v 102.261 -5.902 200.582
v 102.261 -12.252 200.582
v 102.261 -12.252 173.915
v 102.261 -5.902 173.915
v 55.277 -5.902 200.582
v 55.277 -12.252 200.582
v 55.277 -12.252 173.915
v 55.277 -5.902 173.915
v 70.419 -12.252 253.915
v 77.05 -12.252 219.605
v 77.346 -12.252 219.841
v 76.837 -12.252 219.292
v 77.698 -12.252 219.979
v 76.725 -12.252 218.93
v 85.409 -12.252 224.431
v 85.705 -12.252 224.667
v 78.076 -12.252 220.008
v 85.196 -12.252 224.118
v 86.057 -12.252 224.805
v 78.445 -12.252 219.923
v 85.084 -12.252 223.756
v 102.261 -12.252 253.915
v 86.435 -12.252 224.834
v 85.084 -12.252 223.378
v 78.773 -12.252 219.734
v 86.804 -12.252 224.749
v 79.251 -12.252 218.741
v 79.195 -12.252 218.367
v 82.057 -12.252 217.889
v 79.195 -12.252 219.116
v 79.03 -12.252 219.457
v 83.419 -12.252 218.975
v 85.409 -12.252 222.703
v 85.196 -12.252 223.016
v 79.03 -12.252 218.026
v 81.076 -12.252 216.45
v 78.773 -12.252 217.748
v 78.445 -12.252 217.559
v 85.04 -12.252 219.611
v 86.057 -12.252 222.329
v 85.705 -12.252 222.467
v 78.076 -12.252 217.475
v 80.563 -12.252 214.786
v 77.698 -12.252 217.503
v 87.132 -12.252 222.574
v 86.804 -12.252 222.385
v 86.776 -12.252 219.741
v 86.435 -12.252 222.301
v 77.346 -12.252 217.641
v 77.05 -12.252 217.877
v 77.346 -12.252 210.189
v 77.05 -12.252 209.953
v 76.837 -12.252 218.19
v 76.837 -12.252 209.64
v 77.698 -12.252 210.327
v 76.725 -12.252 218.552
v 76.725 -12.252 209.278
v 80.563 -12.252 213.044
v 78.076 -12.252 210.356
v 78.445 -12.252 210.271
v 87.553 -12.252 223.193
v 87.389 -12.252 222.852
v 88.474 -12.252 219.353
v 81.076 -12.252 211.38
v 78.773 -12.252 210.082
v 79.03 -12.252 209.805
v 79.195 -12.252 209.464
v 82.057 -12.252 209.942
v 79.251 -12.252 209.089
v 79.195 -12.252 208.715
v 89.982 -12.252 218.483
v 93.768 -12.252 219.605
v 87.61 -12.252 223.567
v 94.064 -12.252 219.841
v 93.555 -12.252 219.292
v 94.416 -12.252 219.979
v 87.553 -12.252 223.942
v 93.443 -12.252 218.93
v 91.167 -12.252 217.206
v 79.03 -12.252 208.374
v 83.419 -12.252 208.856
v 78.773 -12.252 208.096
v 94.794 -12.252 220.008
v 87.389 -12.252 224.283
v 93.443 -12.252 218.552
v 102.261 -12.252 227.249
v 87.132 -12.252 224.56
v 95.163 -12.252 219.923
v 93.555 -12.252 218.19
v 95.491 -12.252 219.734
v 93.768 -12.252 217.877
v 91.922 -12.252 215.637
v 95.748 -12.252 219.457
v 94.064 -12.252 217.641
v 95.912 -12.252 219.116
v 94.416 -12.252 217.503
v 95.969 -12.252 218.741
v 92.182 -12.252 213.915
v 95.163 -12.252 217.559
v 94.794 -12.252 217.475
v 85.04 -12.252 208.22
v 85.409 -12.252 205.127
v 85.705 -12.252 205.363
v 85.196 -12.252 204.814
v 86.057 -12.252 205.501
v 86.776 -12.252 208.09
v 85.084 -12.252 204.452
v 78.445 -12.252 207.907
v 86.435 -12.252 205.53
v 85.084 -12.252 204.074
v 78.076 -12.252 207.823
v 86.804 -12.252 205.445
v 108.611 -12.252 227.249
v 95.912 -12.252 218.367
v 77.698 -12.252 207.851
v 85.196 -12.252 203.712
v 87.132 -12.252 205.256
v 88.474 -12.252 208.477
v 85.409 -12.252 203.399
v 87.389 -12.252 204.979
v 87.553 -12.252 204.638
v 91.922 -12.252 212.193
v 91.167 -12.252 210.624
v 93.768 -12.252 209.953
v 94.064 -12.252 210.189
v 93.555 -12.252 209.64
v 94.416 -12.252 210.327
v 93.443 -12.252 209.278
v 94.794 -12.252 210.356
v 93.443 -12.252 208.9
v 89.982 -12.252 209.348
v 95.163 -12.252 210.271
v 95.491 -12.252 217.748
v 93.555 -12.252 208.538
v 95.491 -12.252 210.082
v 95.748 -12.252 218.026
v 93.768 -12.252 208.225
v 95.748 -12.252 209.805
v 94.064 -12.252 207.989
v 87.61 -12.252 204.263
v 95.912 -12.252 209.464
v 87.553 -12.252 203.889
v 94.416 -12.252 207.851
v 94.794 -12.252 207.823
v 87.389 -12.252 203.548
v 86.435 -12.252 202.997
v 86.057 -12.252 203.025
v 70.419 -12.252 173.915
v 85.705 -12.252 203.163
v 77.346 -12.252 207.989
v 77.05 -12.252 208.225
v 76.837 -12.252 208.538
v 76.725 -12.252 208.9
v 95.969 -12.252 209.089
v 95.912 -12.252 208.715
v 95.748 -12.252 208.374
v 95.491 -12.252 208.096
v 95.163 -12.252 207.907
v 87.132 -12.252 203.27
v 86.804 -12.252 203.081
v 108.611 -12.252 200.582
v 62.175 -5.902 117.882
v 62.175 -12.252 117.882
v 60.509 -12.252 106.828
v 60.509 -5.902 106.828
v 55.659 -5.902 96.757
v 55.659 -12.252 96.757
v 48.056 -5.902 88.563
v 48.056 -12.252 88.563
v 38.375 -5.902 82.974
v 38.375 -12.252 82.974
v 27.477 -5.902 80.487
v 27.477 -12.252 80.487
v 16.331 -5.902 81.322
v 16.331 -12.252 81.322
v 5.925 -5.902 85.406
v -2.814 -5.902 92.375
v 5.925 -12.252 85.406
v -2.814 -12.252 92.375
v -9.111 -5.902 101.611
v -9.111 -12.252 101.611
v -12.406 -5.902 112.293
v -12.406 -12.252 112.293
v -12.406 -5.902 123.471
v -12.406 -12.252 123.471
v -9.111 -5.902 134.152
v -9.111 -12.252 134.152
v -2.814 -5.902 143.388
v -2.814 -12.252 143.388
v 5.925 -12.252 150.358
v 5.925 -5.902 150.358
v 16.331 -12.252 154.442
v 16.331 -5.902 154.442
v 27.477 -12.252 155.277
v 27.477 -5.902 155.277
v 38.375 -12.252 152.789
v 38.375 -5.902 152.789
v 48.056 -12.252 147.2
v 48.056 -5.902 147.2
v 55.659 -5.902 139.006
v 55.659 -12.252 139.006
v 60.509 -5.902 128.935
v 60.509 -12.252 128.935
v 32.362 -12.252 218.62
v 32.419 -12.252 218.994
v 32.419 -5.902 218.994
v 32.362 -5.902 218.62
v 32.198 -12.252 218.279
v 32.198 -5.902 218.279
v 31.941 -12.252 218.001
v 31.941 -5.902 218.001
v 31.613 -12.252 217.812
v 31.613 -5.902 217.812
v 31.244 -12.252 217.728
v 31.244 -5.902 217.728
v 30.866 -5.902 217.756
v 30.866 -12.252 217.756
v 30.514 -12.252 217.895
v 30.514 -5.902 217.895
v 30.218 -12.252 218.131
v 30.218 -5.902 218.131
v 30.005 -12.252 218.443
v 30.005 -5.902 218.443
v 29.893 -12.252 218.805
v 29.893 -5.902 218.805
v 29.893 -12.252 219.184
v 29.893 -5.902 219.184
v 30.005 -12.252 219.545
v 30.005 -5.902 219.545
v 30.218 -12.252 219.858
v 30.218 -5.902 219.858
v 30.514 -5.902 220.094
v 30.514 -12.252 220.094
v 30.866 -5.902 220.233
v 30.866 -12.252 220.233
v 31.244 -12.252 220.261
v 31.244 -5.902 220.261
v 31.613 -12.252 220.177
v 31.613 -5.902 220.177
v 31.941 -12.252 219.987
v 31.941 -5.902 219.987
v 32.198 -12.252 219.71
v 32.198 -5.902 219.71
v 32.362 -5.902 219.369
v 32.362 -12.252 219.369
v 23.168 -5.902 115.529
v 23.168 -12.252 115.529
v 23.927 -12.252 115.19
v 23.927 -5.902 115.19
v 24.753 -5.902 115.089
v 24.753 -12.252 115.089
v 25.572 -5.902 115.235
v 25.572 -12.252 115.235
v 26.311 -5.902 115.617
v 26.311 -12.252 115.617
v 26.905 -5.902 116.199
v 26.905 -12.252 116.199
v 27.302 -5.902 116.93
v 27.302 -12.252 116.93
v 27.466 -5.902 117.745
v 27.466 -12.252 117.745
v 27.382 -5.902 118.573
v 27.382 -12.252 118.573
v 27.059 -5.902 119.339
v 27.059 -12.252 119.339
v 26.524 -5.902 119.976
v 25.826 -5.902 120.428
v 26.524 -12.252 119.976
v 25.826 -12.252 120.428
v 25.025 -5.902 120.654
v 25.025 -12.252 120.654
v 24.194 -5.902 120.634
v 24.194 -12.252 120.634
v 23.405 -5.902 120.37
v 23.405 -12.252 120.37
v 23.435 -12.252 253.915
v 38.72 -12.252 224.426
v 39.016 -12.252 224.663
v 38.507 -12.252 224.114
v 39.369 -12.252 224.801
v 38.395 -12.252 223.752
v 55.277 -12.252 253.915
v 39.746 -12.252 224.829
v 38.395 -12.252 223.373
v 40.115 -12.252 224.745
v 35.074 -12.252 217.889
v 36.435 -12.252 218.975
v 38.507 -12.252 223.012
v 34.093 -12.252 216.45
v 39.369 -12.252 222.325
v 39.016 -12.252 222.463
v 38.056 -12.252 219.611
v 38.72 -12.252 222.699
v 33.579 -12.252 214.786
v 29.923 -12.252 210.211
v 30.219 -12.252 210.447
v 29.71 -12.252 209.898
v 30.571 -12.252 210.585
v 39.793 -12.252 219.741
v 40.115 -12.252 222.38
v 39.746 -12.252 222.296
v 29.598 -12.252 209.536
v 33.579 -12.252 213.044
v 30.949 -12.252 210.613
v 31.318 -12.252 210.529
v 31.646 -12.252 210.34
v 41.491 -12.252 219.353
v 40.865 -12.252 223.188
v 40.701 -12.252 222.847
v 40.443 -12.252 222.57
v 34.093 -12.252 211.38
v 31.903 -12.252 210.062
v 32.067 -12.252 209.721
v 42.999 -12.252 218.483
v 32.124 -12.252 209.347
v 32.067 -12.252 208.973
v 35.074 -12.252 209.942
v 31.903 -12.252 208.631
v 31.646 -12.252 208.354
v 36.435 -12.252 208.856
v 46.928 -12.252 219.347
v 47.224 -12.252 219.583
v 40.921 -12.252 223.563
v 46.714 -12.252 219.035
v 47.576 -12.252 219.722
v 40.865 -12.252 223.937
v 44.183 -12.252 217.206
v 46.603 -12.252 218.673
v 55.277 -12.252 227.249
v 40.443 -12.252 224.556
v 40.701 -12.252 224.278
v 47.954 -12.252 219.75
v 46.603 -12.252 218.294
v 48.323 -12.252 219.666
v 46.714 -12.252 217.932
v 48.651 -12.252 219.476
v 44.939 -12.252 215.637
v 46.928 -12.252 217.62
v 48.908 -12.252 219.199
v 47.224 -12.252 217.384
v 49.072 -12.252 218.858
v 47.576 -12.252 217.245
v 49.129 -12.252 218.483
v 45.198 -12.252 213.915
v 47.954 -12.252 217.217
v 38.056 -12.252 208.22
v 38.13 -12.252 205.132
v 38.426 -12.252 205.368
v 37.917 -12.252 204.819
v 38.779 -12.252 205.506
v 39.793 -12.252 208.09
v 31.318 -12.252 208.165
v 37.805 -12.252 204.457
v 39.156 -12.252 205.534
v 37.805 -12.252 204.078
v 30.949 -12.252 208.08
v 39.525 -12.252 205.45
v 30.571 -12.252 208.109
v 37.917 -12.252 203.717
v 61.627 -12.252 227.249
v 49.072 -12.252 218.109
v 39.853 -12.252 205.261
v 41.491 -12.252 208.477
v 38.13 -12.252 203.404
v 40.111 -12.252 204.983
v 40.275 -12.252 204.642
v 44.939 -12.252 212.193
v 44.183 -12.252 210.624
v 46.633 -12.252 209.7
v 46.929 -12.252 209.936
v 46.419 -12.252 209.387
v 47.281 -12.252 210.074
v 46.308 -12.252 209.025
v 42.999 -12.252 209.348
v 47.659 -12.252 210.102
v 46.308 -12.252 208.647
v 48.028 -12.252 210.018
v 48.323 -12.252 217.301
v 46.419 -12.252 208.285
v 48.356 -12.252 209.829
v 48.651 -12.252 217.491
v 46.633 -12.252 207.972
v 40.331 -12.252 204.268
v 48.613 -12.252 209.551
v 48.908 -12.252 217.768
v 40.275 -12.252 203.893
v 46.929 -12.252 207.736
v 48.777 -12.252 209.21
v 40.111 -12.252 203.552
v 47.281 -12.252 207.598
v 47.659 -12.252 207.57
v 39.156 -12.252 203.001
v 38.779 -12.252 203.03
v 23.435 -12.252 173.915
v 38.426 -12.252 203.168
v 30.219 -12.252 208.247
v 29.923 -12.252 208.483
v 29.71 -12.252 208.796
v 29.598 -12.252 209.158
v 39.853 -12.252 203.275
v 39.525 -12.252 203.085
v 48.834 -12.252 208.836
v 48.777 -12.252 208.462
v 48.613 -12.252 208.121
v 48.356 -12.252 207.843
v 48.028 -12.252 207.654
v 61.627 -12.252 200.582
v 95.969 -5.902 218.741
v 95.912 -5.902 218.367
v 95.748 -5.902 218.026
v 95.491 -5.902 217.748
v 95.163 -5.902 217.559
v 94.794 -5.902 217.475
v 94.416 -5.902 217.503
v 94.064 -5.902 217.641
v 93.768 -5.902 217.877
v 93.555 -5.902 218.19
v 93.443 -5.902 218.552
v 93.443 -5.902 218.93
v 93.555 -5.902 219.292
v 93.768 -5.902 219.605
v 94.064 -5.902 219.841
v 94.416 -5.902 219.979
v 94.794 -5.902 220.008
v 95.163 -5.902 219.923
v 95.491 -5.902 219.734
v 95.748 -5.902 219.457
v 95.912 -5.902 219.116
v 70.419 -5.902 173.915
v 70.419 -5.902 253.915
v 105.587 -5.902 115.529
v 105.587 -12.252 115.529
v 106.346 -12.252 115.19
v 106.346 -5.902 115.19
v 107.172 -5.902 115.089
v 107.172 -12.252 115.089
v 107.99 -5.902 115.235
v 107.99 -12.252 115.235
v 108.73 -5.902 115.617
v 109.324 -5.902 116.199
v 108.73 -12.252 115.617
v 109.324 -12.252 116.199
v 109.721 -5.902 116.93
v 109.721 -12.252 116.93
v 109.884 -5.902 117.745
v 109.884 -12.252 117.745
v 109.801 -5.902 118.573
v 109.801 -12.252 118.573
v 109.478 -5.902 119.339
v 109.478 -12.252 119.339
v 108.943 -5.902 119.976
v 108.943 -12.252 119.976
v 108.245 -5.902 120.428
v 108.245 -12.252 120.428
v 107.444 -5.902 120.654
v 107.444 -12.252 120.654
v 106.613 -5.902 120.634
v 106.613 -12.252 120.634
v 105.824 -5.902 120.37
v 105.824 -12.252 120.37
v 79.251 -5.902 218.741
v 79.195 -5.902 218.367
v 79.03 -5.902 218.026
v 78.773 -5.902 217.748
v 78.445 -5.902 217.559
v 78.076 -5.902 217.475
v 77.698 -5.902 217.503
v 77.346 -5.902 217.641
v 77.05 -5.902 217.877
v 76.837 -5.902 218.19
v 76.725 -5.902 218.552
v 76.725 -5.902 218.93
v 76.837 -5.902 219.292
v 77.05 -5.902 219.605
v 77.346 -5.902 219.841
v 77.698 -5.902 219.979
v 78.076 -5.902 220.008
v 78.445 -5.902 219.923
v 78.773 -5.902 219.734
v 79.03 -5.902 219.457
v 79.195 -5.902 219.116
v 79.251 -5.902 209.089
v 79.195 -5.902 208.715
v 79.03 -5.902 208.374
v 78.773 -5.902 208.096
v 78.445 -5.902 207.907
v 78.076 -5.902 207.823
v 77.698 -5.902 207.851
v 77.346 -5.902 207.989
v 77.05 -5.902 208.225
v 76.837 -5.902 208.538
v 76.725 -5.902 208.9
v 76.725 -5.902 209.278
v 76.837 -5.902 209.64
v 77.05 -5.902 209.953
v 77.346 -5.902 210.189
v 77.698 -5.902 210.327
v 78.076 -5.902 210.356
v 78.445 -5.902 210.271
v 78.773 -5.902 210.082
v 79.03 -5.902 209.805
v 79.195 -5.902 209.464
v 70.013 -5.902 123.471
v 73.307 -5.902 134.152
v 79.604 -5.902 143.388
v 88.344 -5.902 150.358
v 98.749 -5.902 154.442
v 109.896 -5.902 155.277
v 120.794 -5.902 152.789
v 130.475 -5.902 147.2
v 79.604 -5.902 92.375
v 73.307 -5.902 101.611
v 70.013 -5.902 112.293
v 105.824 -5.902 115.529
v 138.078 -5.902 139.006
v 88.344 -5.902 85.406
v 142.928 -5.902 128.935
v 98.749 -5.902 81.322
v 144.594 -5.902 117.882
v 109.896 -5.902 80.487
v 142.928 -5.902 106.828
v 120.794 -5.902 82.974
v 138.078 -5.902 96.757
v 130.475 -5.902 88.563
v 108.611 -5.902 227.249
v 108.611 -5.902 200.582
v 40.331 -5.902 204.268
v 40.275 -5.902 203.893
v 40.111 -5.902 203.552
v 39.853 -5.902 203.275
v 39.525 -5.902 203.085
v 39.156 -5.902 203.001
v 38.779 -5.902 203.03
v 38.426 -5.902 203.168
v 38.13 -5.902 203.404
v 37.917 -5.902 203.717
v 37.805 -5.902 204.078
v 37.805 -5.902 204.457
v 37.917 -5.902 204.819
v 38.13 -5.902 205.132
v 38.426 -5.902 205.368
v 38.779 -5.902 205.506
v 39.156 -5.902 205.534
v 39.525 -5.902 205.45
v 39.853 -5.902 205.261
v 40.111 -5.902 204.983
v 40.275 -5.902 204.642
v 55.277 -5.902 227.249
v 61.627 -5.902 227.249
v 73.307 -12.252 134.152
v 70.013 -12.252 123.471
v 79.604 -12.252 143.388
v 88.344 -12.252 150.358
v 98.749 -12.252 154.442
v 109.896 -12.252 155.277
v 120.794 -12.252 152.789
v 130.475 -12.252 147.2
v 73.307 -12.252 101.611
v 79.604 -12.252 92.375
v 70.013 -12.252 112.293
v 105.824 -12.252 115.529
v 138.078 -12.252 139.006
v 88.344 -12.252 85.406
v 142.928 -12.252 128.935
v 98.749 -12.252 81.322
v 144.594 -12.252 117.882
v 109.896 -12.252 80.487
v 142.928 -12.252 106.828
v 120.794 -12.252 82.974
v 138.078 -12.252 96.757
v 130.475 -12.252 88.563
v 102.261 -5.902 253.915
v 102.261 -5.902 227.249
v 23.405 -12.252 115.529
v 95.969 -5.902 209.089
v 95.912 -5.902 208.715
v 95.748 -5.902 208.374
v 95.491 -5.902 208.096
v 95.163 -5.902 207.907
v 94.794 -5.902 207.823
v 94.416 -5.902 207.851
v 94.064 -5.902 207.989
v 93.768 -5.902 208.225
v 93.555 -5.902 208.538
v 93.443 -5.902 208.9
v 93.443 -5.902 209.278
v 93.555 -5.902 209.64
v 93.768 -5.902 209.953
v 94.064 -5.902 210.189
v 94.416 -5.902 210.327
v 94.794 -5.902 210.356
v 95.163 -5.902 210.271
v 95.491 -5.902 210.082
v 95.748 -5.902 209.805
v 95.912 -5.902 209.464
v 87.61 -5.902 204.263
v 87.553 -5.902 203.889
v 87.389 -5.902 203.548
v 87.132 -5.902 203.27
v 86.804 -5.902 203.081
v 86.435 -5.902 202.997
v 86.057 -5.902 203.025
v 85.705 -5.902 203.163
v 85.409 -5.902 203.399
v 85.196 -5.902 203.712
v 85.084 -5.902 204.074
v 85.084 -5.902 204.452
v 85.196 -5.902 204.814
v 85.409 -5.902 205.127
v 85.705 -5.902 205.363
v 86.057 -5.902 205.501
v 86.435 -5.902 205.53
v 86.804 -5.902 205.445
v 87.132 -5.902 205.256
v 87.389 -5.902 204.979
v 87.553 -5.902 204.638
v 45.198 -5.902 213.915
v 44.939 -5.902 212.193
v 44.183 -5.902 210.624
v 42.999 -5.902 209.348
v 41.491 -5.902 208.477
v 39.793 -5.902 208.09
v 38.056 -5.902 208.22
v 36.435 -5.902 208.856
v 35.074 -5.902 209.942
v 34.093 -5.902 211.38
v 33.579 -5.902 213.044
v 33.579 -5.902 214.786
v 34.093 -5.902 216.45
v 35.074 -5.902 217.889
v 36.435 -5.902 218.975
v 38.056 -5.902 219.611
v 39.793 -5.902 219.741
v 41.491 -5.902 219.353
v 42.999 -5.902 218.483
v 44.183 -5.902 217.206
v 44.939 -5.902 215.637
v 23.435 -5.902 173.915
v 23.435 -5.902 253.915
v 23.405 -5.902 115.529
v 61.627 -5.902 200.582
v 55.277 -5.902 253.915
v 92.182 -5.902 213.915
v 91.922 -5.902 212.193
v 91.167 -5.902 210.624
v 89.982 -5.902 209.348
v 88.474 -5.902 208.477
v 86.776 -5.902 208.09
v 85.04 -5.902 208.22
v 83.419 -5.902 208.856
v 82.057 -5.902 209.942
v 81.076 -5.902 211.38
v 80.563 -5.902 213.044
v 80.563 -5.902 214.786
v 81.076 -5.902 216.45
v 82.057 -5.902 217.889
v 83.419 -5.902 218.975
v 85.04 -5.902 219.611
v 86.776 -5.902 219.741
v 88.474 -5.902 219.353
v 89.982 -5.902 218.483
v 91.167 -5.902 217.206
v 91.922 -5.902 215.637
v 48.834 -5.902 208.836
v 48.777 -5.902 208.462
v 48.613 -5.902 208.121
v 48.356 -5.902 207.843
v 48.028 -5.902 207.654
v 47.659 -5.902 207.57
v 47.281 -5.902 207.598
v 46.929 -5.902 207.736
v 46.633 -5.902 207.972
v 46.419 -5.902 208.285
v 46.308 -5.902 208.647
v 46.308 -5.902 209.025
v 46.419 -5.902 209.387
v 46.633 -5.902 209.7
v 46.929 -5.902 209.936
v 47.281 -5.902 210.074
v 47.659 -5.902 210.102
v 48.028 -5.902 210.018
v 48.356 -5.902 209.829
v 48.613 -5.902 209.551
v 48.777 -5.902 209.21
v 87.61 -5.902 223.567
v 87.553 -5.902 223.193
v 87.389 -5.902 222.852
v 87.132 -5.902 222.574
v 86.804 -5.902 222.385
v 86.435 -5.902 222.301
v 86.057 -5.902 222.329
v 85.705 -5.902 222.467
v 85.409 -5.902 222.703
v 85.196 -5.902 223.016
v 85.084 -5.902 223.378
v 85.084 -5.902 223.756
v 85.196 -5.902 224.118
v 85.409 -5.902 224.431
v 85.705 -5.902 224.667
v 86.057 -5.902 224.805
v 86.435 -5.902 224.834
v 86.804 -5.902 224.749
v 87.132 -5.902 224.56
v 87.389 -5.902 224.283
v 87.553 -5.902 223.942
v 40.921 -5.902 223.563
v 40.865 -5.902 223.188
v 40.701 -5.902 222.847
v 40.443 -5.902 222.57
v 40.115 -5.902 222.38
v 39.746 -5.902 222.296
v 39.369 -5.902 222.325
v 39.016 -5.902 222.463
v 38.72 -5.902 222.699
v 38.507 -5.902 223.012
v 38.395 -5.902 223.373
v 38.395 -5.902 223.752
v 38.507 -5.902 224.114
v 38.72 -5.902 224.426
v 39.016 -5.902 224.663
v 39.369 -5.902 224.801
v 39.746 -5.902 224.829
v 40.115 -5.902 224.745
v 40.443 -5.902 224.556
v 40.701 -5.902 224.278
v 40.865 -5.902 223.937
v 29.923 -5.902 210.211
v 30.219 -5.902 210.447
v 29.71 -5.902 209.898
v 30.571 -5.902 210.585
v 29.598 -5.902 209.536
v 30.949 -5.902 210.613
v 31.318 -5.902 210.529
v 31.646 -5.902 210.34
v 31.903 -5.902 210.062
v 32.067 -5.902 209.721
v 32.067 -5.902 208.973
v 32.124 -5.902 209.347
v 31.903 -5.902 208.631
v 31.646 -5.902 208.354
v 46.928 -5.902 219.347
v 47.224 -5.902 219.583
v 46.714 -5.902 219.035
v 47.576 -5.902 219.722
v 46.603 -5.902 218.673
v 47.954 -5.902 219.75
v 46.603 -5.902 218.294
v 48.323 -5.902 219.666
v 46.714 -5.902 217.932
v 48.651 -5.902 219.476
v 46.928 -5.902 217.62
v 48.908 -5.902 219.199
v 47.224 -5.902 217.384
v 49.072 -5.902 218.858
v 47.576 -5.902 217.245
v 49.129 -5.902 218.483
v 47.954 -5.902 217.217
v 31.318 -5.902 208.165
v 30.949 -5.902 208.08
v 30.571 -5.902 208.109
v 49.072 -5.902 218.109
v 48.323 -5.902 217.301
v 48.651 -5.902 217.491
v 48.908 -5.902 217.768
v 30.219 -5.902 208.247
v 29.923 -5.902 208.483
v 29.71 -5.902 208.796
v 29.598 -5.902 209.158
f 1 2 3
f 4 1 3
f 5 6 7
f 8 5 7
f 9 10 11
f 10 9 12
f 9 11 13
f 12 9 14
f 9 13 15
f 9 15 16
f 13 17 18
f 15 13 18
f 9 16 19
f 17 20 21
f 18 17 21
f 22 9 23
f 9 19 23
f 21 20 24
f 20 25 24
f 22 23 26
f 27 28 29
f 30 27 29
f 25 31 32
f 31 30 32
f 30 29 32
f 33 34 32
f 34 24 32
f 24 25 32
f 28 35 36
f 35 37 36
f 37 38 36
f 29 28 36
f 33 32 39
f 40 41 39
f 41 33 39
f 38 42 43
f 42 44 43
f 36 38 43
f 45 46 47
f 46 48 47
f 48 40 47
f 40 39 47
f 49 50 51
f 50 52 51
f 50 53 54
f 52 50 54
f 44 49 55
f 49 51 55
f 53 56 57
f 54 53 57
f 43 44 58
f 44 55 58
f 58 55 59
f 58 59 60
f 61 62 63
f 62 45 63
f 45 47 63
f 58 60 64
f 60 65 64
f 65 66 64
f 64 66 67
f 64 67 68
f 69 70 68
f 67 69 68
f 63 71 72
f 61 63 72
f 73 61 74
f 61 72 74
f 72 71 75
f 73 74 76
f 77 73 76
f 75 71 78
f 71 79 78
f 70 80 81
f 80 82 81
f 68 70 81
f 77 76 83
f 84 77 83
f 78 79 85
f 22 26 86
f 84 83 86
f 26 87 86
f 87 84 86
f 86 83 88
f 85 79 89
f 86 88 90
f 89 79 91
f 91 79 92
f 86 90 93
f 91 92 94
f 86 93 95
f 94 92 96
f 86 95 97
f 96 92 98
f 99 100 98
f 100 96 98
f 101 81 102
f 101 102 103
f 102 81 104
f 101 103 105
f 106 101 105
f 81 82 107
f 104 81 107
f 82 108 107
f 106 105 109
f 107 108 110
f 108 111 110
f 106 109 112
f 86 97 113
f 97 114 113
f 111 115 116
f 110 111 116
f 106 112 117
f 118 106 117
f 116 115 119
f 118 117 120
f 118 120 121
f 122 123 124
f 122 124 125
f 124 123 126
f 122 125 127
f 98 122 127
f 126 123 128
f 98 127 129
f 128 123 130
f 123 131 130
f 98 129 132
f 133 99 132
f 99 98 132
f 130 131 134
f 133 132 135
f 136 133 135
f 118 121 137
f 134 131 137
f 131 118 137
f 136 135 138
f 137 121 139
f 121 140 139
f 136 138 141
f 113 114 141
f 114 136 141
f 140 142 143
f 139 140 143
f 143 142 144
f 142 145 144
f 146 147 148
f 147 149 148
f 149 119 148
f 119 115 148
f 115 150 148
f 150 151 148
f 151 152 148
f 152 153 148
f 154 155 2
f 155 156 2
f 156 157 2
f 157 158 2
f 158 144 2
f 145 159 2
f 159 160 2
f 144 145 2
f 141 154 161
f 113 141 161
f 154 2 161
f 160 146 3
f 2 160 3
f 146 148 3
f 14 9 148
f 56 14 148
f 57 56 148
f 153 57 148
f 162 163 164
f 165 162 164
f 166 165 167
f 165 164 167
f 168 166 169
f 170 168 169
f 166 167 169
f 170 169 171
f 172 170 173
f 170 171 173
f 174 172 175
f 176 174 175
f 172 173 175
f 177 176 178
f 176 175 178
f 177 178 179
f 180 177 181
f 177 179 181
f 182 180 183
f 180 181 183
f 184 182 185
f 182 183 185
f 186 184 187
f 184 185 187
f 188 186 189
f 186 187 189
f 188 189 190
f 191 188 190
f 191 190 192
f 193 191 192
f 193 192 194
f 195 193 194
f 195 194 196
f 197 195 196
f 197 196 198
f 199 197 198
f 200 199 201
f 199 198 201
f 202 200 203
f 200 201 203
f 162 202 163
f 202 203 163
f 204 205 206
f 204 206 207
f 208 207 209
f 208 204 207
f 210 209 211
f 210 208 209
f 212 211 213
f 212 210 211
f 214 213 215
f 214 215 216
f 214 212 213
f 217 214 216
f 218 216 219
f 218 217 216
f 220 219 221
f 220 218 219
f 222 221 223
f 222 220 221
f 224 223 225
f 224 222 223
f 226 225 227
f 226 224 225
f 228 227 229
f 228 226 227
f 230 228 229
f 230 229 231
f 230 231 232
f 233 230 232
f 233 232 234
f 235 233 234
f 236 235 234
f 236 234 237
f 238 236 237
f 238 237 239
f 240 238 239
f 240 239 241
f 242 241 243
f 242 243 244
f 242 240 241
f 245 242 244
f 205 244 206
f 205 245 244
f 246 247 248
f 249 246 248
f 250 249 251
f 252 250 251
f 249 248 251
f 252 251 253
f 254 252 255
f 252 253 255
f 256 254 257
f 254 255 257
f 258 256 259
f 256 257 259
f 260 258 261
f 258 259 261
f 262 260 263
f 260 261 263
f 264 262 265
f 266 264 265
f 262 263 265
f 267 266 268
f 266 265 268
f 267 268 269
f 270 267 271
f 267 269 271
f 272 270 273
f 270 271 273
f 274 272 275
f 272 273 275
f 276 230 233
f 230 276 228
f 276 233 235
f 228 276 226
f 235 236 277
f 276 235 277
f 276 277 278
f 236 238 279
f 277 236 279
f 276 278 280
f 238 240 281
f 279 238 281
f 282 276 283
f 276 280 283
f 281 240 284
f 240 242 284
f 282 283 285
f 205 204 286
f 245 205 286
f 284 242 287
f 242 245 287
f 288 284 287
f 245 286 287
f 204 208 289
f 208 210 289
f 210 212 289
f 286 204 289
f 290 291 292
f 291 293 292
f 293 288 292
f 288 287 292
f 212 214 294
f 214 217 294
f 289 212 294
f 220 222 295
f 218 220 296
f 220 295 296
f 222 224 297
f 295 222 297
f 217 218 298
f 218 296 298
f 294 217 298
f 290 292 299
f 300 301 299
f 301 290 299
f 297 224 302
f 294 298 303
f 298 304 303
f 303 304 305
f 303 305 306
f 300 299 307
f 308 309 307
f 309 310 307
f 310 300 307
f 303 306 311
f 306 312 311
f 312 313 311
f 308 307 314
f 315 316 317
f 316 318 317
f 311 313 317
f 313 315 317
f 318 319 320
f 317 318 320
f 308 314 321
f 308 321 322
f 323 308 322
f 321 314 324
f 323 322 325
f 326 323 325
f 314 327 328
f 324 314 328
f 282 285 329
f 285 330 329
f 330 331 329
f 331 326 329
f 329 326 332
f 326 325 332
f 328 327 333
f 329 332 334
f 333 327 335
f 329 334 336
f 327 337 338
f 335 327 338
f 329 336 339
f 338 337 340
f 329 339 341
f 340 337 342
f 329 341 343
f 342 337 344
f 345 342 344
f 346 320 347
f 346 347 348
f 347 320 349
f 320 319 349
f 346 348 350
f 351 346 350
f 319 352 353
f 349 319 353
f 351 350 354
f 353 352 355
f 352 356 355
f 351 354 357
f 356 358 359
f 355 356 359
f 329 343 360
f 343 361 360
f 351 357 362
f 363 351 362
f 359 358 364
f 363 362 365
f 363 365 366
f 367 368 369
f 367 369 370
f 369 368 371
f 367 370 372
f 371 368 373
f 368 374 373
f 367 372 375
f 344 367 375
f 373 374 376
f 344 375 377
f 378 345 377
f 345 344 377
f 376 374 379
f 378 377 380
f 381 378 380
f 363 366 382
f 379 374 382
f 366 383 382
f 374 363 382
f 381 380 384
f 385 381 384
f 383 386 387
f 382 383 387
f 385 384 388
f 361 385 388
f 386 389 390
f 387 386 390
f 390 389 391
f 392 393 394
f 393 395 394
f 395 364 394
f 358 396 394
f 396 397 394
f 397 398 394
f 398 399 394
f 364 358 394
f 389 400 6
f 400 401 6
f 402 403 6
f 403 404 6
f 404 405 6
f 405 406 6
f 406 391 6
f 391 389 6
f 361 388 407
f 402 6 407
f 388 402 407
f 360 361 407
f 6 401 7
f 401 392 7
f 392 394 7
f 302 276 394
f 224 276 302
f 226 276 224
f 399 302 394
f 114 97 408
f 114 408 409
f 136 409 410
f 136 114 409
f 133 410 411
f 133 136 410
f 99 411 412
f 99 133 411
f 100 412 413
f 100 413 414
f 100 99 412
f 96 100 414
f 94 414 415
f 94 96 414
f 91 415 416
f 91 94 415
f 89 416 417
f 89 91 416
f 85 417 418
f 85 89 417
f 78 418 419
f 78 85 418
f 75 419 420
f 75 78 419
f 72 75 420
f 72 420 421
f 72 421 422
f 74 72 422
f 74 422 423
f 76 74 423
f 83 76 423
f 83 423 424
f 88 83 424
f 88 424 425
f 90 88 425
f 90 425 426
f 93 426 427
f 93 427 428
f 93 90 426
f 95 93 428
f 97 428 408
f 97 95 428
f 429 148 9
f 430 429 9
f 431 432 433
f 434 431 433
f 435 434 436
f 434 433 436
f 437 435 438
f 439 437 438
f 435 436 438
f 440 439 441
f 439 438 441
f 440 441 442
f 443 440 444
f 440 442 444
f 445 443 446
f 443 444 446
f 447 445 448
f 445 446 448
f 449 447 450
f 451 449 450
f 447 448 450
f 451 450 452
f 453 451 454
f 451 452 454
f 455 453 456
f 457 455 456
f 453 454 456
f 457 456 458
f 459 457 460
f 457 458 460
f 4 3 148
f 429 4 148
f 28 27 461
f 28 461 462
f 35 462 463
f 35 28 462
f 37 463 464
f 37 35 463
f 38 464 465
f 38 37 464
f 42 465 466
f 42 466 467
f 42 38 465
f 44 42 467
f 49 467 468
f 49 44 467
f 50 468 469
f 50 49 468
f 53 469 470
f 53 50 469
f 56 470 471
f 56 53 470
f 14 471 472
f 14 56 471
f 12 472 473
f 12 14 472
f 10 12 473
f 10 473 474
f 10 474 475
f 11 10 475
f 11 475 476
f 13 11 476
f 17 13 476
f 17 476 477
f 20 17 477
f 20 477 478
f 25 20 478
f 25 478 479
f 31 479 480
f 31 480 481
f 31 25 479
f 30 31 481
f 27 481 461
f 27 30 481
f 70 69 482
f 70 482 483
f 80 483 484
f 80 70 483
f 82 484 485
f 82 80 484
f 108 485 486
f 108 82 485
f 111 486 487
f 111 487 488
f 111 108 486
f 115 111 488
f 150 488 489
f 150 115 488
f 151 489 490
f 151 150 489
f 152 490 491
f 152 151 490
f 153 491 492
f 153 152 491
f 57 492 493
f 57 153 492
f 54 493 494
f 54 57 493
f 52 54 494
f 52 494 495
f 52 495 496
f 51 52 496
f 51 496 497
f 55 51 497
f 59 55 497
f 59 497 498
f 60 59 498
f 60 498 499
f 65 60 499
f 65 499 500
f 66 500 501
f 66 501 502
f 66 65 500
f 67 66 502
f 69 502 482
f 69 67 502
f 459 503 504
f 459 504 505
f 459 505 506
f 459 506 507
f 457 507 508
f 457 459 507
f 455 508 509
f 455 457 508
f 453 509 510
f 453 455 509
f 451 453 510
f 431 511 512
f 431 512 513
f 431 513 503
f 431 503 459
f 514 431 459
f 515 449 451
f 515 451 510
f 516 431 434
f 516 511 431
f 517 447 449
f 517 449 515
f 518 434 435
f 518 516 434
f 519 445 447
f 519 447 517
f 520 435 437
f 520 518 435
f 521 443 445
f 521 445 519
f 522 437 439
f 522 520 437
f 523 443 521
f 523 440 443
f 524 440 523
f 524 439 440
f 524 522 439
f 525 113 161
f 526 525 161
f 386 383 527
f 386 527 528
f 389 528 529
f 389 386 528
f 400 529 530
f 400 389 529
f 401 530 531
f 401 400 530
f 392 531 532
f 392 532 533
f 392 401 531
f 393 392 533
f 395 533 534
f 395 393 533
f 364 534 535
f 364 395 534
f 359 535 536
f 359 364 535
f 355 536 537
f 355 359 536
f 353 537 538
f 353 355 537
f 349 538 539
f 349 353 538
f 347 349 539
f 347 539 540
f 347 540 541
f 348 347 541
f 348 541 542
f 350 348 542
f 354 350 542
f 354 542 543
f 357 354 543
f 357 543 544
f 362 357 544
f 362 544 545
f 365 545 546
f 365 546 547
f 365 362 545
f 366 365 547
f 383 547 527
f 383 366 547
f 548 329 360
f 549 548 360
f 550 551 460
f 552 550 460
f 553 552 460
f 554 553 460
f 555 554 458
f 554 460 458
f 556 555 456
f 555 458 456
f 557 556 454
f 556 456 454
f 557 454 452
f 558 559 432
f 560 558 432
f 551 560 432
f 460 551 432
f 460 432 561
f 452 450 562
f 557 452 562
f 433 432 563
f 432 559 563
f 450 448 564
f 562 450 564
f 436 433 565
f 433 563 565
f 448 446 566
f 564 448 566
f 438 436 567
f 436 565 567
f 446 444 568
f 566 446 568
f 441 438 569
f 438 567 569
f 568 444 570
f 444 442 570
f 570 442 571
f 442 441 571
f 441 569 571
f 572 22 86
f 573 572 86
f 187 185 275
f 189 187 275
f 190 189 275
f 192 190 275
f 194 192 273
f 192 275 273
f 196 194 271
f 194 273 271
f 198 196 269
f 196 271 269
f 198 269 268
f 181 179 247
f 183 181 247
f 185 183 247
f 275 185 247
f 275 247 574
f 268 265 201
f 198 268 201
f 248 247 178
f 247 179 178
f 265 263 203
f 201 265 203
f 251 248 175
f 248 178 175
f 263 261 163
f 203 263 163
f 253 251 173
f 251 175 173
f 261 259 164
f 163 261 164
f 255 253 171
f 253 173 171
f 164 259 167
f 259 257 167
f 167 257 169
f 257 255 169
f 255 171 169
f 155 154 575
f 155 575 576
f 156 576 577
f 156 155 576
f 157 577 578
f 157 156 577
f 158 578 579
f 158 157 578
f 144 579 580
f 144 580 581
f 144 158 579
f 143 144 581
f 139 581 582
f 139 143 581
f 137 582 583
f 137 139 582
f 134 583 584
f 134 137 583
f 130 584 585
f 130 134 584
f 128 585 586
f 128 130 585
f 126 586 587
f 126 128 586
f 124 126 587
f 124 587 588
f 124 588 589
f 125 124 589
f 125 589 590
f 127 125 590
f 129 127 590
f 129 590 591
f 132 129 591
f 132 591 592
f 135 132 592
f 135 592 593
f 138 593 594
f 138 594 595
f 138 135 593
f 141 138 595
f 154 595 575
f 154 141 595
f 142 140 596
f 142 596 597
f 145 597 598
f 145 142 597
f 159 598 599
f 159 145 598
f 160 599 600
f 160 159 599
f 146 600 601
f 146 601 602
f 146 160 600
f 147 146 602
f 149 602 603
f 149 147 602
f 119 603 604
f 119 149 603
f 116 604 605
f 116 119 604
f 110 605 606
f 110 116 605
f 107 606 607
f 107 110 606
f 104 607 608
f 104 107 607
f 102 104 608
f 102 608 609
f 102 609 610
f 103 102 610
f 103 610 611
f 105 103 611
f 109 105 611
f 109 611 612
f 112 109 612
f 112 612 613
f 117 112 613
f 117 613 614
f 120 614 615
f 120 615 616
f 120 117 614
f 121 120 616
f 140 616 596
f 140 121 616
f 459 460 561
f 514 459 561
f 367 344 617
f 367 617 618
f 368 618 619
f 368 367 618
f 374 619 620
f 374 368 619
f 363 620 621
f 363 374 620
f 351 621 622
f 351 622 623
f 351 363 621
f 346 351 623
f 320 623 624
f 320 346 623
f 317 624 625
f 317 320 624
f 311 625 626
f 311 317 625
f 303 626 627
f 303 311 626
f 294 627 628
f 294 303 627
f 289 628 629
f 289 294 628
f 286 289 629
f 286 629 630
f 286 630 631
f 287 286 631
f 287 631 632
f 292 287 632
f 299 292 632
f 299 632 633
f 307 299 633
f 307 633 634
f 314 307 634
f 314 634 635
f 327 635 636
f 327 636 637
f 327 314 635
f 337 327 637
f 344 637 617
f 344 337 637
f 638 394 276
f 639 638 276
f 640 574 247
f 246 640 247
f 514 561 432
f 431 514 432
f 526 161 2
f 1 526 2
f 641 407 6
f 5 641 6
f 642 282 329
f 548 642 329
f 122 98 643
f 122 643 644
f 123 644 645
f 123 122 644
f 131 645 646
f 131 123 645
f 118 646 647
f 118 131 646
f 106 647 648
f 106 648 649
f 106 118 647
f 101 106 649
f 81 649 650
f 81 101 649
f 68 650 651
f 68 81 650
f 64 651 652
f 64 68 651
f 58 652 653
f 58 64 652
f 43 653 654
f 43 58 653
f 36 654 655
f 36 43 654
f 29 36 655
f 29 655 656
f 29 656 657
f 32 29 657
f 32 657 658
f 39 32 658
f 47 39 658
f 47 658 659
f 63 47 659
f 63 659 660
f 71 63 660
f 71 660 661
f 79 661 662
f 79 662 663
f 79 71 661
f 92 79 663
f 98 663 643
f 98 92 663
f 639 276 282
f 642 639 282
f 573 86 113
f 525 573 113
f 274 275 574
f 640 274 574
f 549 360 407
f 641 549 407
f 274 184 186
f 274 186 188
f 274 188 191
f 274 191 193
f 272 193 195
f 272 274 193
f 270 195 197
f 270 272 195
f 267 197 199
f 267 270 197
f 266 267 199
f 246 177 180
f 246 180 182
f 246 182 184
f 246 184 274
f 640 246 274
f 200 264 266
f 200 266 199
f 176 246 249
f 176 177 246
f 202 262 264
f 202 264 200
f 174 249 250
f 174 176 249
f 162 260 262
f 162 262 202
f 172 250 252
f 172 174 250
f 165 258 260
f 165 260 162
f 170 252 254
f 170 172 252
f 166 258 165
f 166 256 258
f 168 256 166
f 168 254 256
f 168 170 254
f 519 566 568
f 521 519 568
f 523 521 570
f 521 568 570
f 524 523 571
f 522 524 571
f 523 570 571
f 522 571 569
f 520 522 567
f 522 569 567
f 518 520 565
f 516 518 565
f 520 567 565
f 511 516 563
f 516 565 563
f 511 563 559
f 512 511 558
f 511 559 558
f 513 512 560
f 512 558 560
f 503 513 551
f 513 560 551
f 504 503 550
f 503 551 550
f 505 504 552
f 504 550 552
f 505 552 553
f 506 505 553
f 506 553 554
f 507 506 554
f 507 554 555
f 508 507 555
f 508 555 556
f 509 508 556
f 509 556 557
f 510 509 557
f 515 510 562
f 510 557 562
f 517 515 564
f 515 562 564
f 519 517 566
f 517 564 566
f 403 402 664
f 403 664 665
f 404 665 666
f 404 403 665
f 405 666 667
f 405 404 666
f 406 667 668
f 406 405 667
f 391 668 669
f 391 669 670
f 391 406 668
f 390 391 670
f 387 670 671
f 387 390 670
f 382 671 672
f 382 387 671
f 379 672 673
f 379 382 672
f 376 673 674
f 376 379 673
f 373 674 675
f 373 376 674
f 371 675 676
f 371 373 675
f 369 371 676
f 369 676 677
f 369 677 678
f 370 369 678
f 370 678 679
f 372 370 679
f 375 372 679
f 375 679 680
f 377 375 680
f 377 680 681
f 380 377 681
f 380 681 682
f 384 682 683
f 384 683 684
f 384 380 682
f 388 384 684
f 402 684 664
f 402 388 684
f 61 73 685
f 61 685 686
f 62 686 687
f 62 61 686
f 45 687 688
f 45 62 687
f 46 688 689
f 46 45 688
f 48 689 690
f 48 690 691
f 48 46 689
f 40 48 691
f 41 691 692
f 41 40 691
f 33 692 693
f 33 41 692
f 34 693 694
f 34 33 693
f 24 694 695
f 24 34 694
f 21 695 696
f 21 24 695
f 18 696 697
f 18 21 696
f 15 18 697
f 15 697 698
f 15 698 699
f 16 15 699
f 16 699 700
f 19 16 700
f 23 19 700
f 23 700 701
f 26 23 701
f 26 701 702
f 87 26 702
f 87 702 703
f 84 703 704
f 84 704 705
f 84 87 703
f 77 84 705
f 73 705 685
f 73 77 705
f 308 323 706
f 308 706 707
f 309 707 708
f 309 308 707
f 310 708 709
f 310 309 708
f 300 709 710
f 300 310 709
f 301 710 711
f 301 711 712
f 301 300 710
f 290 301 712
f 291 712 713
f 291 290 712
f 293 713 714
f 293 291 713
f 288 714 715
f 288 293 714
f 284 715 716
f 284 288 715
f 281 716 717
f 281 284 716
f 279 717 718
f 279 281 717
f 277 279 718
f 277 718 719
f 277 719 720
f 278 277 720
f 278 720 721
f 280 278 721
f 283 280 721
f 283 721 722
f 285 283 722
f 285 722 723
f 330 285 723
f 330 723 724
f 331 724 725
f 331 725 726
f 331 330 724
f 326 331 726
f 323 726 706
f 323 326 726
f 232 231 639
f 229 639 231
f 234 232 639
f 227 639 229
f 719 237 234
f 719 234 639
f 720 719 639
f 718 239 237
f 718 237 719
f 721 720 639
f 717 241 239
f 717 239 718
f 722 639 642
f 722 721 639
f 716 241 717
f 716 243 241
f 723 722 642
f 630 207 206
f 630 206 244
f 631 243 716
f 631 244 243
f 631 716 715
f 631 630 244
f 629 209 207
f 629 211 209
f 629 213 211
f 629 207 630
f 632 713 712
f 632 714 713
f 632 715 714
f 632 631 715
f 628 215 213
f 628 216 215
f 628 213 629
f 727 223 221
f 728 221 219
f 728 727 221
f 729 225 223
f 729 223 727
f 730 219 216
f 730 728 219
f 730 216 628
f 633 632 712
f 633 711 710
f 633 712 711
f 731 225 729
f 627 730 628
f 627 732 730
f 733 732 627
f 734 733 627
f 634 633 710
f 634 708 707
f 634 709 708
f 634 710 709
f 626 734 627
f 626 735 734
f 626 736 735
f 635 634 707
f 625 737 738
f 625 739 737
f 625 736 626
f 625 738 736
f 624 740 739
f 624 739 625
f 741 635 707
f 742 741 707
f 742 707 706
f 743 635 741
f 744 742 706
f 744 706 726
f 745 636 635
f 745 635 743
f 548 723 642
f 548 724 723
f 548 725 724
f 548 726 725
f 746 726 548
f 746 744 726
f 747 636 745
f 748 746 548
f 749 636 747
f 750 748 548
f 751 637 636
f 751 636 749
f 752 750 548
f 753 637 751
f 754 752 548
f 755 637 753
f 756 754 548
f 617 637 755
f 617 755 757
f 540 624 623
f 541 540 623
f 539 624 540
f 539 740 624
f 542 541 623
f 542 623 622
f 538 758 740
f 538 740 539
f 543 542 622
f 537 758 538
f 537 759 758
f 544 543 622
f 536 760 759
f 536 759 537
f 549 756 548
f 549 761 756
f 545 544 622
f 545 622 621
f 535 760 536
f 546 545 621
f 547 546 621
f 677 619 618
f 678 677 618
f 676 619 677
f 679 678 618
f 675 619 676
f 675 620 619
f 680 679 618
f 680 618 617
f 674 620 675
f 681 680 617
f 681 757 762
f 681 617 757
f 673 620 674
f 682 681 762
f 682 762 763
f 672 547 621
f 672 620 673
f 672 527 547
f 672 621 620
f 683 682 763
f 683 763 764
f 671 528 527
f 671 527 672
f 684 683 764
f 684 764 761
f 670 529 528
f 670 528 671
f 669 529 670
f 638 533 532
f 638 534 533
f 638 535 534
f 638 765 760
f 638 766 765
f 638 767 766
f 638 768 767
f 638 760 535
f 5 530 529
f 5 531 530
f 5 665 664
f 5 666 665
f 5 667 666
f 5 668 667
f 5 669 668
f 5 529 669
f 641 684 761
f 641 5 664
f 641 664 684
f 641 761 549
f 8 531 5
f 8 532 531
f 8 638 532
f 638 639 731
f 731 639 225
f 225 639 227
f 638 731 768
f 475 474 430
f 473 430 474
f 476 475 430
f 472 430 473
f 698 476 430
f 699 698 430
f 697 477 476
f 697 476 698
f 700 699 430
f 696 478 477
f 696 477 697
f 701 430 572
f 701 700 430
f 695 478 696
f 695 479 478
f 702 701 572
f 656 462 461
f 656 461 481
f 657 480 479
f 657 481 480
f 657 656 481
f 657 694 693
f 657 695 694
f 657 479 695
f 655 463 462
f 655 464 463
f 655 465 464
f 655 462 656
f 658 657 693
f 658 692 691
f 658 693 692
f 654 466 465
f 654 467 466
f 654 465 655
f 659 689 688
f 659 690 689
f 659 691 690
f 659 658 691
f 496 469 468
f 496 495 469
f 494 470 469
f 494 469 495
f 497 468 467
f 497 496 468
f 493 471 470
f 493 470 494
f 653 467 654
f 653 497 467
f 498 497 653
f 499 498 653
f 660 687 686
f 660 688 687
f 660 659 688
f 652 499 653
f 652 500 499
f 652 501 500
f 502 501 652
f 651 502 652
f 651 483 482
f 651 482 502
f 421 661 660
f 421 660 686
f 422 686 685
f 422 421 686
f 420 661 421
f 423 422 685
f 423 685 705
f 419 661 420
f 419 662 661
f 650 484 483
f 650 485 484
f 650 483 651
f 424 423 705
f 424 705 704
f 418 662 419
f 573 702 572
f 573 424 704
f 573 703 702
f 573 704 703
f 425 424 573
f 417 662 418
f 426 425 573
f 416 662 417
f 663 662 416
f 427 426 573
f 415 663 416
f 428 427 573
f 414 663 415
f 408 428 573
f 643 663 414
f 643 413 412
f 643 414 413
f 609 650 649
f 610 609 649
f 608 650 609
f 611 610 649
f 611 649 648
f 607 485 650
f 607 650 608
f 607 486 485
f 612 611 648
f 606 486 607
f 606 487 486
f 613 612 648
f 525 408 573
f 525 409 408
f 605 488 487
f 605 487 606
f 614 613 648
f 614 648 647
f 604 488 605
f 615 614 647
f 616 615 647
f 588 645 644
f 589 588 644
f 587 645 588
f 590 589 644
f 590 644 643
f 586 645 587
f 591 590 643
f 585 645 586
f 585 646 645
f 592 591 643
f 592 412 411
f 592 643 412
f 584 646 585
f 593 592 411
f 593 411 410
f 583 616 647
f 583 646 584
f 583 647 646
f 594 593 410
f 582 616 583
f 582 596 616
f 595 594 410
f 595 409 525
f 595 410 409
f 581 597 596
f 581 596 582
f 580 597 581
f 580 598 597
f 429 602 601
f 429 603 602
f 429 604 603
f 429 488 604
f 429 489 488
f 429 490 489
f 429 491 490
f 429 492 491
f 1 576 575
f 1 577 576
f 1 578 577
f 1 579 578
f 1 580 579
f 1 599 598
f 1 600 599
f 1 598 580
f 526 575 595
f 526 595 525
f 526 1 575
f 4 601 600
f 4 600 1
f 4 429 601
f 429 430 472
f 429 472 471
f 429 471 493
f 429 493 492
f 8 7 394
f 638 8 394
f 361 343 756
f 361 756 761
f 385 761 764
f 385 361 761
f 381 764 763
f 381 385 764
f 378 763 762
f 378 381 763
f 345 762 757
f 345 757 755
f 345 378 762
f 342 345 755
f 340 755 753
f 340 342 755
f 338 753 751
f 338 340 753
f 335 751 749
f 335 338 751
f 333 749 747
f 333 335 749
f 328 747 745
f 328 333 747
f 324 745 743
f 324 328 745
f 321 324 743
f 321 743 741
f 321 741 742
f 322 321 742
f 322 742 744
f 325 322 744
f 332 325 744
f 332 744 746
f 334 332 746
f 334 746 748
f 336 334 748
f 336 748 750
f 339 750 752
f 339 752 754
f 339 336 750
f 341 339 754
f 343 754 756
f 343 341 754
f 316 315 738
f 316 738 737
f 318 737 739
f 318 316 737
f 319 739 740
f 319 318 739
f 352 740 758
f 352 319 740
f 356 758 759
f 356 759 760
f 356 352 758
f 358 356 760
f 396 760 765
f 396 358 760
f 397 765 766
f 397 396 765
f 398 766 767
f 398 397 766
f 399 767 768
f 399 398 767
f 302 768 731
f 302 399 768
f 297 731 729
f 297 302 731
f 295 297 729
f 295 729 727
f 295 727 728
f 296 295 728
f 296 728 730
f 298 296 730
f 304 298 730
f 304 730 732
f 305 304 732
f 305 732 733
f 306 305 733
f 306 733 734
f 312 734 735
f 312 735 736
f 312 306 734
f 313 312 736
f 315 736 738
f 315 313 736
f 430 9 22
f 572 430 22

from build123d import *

# Parameters (mm, degrees)
MOTORIZED_START                      = -12.251519109
MOTORIZED_PLATFORM_MDF_OUTLINE_R     = 1.27
MOTORIZED_PLATFORM_MDF_OUTLINE_R_2   = 5.842
MOTORIZED_PLATFORM_MDF_DEPTH         = 6.35
MOTORIZED_PLATFORM_MDF_2_OUTLINE_R   = 37.5
MOTORIZED_PLATFORM_MDF_2_DEPTH       = 6.35
MOTORIZED_PLATFORM_MDF_3_OUTLINE_R   = 1.27
MOTORIZED_PLATFORM_MDF_3_OUTLINE_R_2 = 5.842
MOTORIZED_PLATFORM_MDF_3_DEPTH       = 6.35
MOTORIZED_START_2                    = -12.251519108
MOTORIZED_PLATFORM_MDF_4_OUTLINE_R   = 37.5
MOTORIZED_PLATFORM_MDF_4_DEPTH       = 6.35
MOTORIZED_PLATFORM_MDF_5_OUTLINE_W   = 6.35
MOTORIZED_PLATFORM_MDF_5_OUTLINE_H   = 8.382
MOTORIZED_PLATFORM_MDF_5_OUTLINE_H_2 = 4.7625
MOTORIZED_PLATFORM_MDF_5_OUTLINE_W_2 = 4.7625
MOTORIZED_PLATFORM_MDF_5_OUTLINE_H_3 = 6.35
MOTORIZED_PLATFORM_MDF_5_OUTLINE_R   = 3.175
MOTORIZED_PLATFORM_MDF_5_OUTLINE_R_2 = 12.7
MOTORIZED_PLATFORM_MDF_5_DEPTH       = 6.35
MOTORIZED_PLATFORM_MDF_6_DEPTH       = 6.35
MOTORIZED_PLATFORM_MDF_7_DEPTH       = 6.35
MOTORIZED_PLATFORM_MDF_8_DEPTH       = 6.35
MOTORIZED_PLATFORM_MDF_9_DEPTH       = 6.35


with BuildPart() as part:
    # Motorized Platform MDF: read off the stored shape, not the designer's step
    # Motorized Platform MDF outline → Motorized Platform MDF (new body)
    with BuildSketch(Plane(origin=(0, 0, 0), x_dir=(1, 0, 0), z_dir=(0, 1, 0)).offset(MOTORIZED_START)):
        Polygon((102.260824506, -253.915186521), (102.260824506, -227.248519855), (108.610824506, -227.248519855), (108.610824506, -200.581853188), (102.260824506, -200.581853188), (102.260824506, -173.915186521), (70.418955754, -173.915186521), (70.418955754, -253.915186521), align=None)
        with Locations((77.981012933, -218.741186531)):
            Circle(MOTORIZED_PLATFORM_MDF_OUTLINE_R, mode=Mode.SUBTRACT)
        with Locations((86.33989013, -223.567186531)):
            Circle(MOTORIZED_PLATFORM_MDF_OUTLINE_R, mode=Mode.SUBTRACT)
        with Locations((86.33989013, -213.915186531)):
            Circle(MOTORIZED_PLATFORM_MDF_OUTLINE_R_2, mode=Mode.SUBTRACT)
        with Locations((94.698767327, -218.741186531)):
            Circle(MOTORIZED_PLATFORM_MDF_OUTLINE_R, mode=Mode.SUBTRACT)
        with Locations((77.981012933, -209.089186531)):
            Circle(MOTORIZED_PLATFORM_MDF_OUTLINE_R, mode=Mode.SUBTRACT)
        with Locations((86.33989013, -204.263186531)):
            Circle(MOTORIZED_PLATFORM_MDF_OUTLINE_R, mode=Mode.SUBTRACT)
        with Locations((94.698767327, -209.089186531)):
            Circle(MOTORIZED_PLATFORM_MDF_OUTLINE_R, mode=Mode.SUBTRACT)
    extrude(amount=MOTORIZED_PLATFORM_MDF_DEPTH)


with BuildPart() as body_2:
    # Motorized Platform MDF 2 outline → Motorized Platform MDF 2 (new body)
    with BuildSketch(Plane(origin=(0, 0, 0), x_dir=(1.0, 1.07258646409036e-12, 0), z_dir=(-1.07258646409036e-12, 1.0, 0)).offset(MOTORIZED_START)):
        with Locations((122.488955754, -71.766463003)):
            Circle(MOTORIZED_PLATFORM_MDF_2_OUTLINE_R)
        with BuildLine():
            Line((121.218955754, -69.413822237), (120.981800344, -69.413822237))
            ThreePointArc((120.981800344, -69.413822237), (125.279609539, -71.629760962), (121.218955754, -74.255144582))
            Line((121.218955754, -74.255144582), (121.218955754, -69.413822237))
        make_face(mode=Mode.SUBTRACT)
    extrude(amount=MOTORIZED_PLATFORM_MDF_2_DEPTH)


with BuildPart() as body_3:
    # Motorized Platform MDF 3 outline → Motorized Platform MDF 3 (new body)
    with BuildSketch(Plane(origin=(0, 0, 0), x_dir=(1, 0, 0), z_dir=(0, 1, 0)).offset(MOTORIZED_START)):
        Polygon((-228.031044246, -253.915186521), (-228.031044246, -227.248519848), (-221.681044246, -227.248519848), (-221.681044246, -200.581853175), (-228.031044246, -200.581853175), (-228.031044246, -173.915186501), (-259.872912998, -173.915186501), (-259.872912998, -253.915186521), align=None)
        with Locations((-252.159469118, -218.99437973)):
            Circle(MOTORIZED_PLATFORM_MDF_3_OUTLINE_R, mode=Mode.SUBTRACT)
        with Locations((-243.657013512, -223.562678392)):
            Circle(MOTORIZED_PLATFORM_MDF_3_OUTLINE_R, mode=Mode.SUBTRACT)
        with Locations((-235.449523016, -218.483485173)):
            Circle(MOTORIZED_PLATFORM_MDF_3_OUTLINE_R, mode=Mode.SUBTRACT)
        with Locations((-252.454434228, -209.346887849)):
            Circle(MOTORIZED_PLATFORM_MDF_3_OUTLINE_R, mode=Mode.SUBTRACT)
        with Locations((-243.951978622, -213.915186511)):
            Circle(MOTORIZED_PLATFORM_MDF_3_OUTLINE_R_2, mode=Mode.SUBTRACT)
        with Locations((-244.246943732, -204.267694631)):
            Circle(MOTORIZED_PLATFORM_MDF_3_OUTLINE_R, mode=Mode.SUBTRACT)
        with Locations((-235.744488126, -208.835993293)):
            Circle(MOTORIZED_PLATFORM_MDF_3_OUTLINE_R, mode=Mode.SUBTRACT)
    extrude(amount=MOTORIZED_PLATFORM_MDF_3_DEPTH)


with BuildPart() as body_4:
    # Motorized Platform MDF 4 outline → Motorized Platform MDF 4 (new body)
    with BuildSketch(Plane(origin=(0, 0, 0), x_dir=(1.0, 1.07258646409036e-12, 0), z_dir=(-1.07258646409036e-12, 1.0, 0)).offset(MOTORIZED_START_2)):
        with Locations((-272.481044246, -71.766463003)):
            Circle(MOTORIZED_PLATFORM_MDF_4_OUTLINE_R)
        with BuildLine():
            Line((-273.751044246, -69.413822237), (-273.988199656, -69.413822237))
            ThreePointArc((-273.988199656, -69.413822237), (-269.69039046, -71.629760962), (-273.751044246, -74.255144582))
            Line((-273.751044246, -74.255144582), (-273.751044246, -69.413822237))
        make_face(mode=Mode.SUBTRACT)
    extrude(amount=MOTORIZED_PLATFORM_MDF_4_DEPTH)


with BuildPart() as body_5:
    # Motorized Platform MDF 5 outline → Motorized Platform MDF 5 (new body)
    with BuildSketch(Plane(origin=(0, 0, 0), x_dir=(1, 0, 0), z_dir=(0, 1, 0)).offset(MOTORIZED_START)):
        Polygon((-208.981044246, -127.548519858), (-208.981044246, -154.215186531), (-215.331044246, -154.215186531), (-215.331044246, -253.915186521), (64.068955754, -253.915186521), (64.068955754, -154.215186531), (57.718955754, -154.215186531), (57.718955754, -127.548519858), (51.368955754, -127.548519858), (51.368955754, -100.881853185), (57.718955754, -100.881853185), (57.718955754, -74.215186511), (64.068955754, -74.215186511), (64.068955754, 25.484813479), (-215.331044246, 25.484813479), (-215.331044246, -74.215186511), (-208.981044246, -74.215186511), (-208.981044246, -100.881853185), (-202.631044246, -100.881853185), (-202.631044246, -127.548519858), align=None)
        with Locations((-135.956044246, -230.674186521)):
            Rectangle(MOTORIZED_PLATFORM_MDF_5_OUTLINE_W, MOTORIZED_PLATFORM_MDF_5_OUTLINE_H, mode=Mode.SUBTRACT)
        Polygon((-113.797132761, -156.871403096), (-117.164728806, -160.238999142), (-121.654856867, -155.748871081), (-118.287260821, -152.381275036), align=None, mode=Mode.SUBTRACT)
        Polygon((-94.56808489, -168.229921702), (-96.390614737, -172.629897976), (-102.257249768, -170.19985818), (-100.434719921, -165.799881906), align=None, mode=Mode.SUBTRACT)
        Polygon((-127.215739631, -139.018862197), (-131.615715905, -140.841392043), (-134.0457557, -134.974757012), (-129.645779427, -133.152227165), align=None, mode=Mode.SUBTRACT)
        with Locations((-15.306044246, -230.674186521)):
            Rectangle(MOTORIZED_PLATFORM_MDF_5_OUTLINE_W, MOTORIZED_PLATFORM_MDF_5_OUTLINE_H, mode=Mode.SUBTRACT)
        with Locations((-75.631044246, -173.746436521)):
            Rectangle(MOTORIZED_PLATFORM_MDF_5_OUTLINE_W, MOTORIZED_PLATFORM_MDF_5_OUTLINE_H_2, mode=Mode.SUBTRACT)
        Polygon((-50.827368571, -165.799881906), (-49.004838724, -170.19985818), (-54.871473755, -172.629897976), (-56.694003602, -168.229921702), align=None, mode=Mode.SUBTRACT)
        Polygon((-32.974827671, -152.381275036), (-29.607231626, -155.748871081), (-34.097359686, -160.238999142), (-37.464955731, -156.871403096), align=None, mode=Mode.SUBTRACT)
        Polygon((-21.616309065, -133.152227165), (-17.216332792, -134.974757012), (-19.646372587, -140.841392043), (-24.046348861, -139.018862197), align=None, mode=Mode.SUBTRACT)
        with Locations((-135.162294246, -114.215186521)):
            Rectangle(MOTORIZED_PLATFORM_MDF_5_OUTLINE_W_2, MOTORIZED_PLATFORM_MDF_5_OUTLINE_H_3, mode=Mode.SUBTRACT)
        Polygon((-129.645779427, -95.278145877), (-134.0457557, -93.455616031), (-131.615715905, -87.588980999), (-127.215739631, -89.411510846), align=None, mode=Mode.SUBTRACT)
        Polygon((-118.287260821, -76.049098007), (-121.654856867, -72.681501961), (-117.164728806, -68.191373901), (-113.797132761, -71.558969946), align=None, mode=Mode.SUBTRACT)
        Polygon((-100.434719921, -62.630491136), (-102.257249768, -58.230514862), (-96.390614737, -55.800475067), (-94.56808489, -60.20045134), align=None, mode=Mode.SUBTRACT)
        with Locations((-107.381044246, -25.315186521)):
            Circle(MOTORIZED_PLATFORM_MDF_5_OUTLINE_R, mode=Mode.SUBTRACT)
        with Locations((-135.956044246, 2.243813479)):
            Rectangle(MOTORIZED_PLATFORM_MDF_5_OUTLINE_W, MOTORIZED_PLATFORM_MDF_5_OUTLINE_H, mode=Mode.SUBTRACT)
        with Locations((-107.381044246, 12.784813479)):
            Circle(MOTORIZED_PLATFORM_MDF_5_OUTLINE_R, mode=Mode.SUBTRACT)
        with Locations((-75.631044246, -114.215186521)):
            Circle(MOTORIZED_PLATFORM_MDF_5_OUTLINE_R_2, mode=Mode.SUBTRACT)
        with Locations((-16.099794246, -114.215186521)):
            Rectangle(MOTORIZED_PLATFORM_MDF_5_OUTLINE_W_2, MOTORIZED_PLATFORM_MDF_5_OUTLINE_H_3, mode=Mode.SUBTRACT)
        Polygon((-24.046348861, -89.411510846), (-19.646372587, -87.588980999), (-17.216332792, -93.455616031), (-21.616309065, -95.278145877), align=None, mode=Mode.SUBTRACT)
        with Locations((-75.631044246, -54.683936521)):
            Rectangle(MOTORIZED_PLATFORM_MDF_5_OUTLINE_W, MOTORIZED_PLATFORM_MDF_5_OUTLINE_H_2, mode=Mode.SUBTRACT)
        Polygon((-56.694003602, -60.20045134), (-54.871473755, -55.800475067), (-49.004838724, -58.230514862), (-50.827368571, -62.630491136), align=None, mode=Mode.SUBTRACT)
        Polygon((-37.464955731, -71.558969946), (-34.097359686, -68.191373901), (-29.607231626, -72.681501961), (-32.974827671, -76.049098007), align=None, mode=Mode.SUBTRACT)
        with Locations((-43.881044246, -25.315186521)):
            Circle(MOTORIZED_PLATFORM_MDF_5_OUTLINE_R, mode=Mode.SUBTRACT)
        with Locations((-43.881044246, 12.784813479)):
            Circle(MOTORIZED_PLATFORM_MDF_5_OUTLINE_R, mode=Mode.SUBTRACT)
        with Locations((-15.306044246, 2.243813479)):
            Rectangle(MOTORIZED_PLATFORM_MDF_5_OUTLINE_W, MOTORIZED_PLATFORM_MDF_5_OUTLINE_H, mode=Mode.SUBTRACT)
    extrude(amount=MOTORIZED_PLATFORM_MDF_5_DEPTH)


with BuildPart() as body_6:
    # Motorized Platform MDF 6 outline → Motorized Platform MDF 6 (new body)
    with BuildSketch(Plane(origin=(0, 0, 0), x_dir=(1, 0, 0), z_dir=(0, 1, 0)).offset(MOTORIZED_START)):
        with BuildLine():
            Line((97.935622421, 57.234813479), (106.402289087, 57.234813479))
            ThreePointArc((106.402289087, 57.234813479), (93.702289087, 69.934813479), (81.002289087, 57.234813479))
            Line((81.002289087, 57.234813479), (89.468955754, 57.234813479))
            Line((89.468955754, 57.234813479), (89.468955754, 50.884813479))
            Line((89.468955754, 50.884813479), (97.935622421, 50.884813479))
            Line((97.935622421, 50.884813479), (97.935622421, 57.234813479))
        make_face()
    extrude(amount=MOTORIZED_PLATFORM_MDF_6_DEPTH)


with BuildPart() as body_7:
    # Motorized Platform MDF 7 outline → Motorized Platform MDF 7 (new body)
    with BuildSketch(Plane(origin=(0, 0, 0), x_dir=(1, 0, 0), z_dir=(0, 1, 0)).offset(MOTORIZED_START)):
        with BuildLine():
            Line((-3.664377579, 57.234813479), (4.802289087, 57.234813479))
            ThreePointArc((4.802289087, 57.234813479), (-7.897710913, 69.934813479), (-20.597710913, 57.234813479))
            Line((-20.597710913, 57.234813479), (-12.131044246, 57.234813479))
            Line((-12.131044246, 57.234813479), (-12.131044246, 50.884813479))
            Line((-12.131044246, 50.884813479), (-3.664377579, 50.884813479))
            Line((-3.664377579, 50.884813479), (-3.664377579, 57.234813479))
        make_face()
    extrude(amount=MOTORIZED_PLATFORM_MDF_7_DEPTH)


with BuildPart() as body_8:
    # Motorized Platform MDF 8 outline → Motorized Platform MDF 8 (new body)
    with BuildSketch(Plane(origin=(0, 0, 0), x_dir=(1, 0, 0), z_dir=(0, 1, 0)).offset(MOTORIZED_START)):
        with BuildLine():
            Line((-105.264377579, 57.234813479), (-96.797710913, 57.234813479))
            ThreePointArc((-96.797710913, 57.234813479), (-109.497710913, 69.934813479), (-122.197710913, 57.234813479))
            Line((-122.197710913, 57.234813479), (-113.731044246, 57.234813479))
            Line((-113.731044246, 57.234813479), (-113.731044246, 50.884813479))
            Line((-113.731044246, 50.884813479), (-105.264377579, 50.884813479))
            Line((-105.264377579, 50.884813479), (-105.264377579, 57.234813479))
        make_face()
    extrude(amount=MOTORIZED_PLATFORM_MDF_8_DEPTH)


with BuildPart() as body_9:
    # Motorized Platform MDF 9 outline → Motorized Platform MDF 9 (new body)
    with BuildSketch(Plane(origin=(0, 0, 0), x_dir=(1, 0, 0), z_dir=(0, 1, 0)).offset(MOTORIZED_START)):
        with BuildLine():
            Line((-206.864377579, 57.234813479), (-198.397710913, 57.234813479))
            ThreePointArc((-198.397710913, 57.234813479), (-211.097710913, 69.934813479), (-223.797710913, 57.234813479))
            Line((-223.797710913, 57.234813479), (-215.331044246, 57.234813479))
            Line((-215.331044246, 57.234813479), (-215.331044246, 50.884813479))
            Line((-215.331044246, 50.884813479), (-206.864377579, 50.884813479))
            Line((-206.864377579, 50.884813479), (-206.864377579, 57.234813479))
        make_face()
    extrude(amount=MOTORIZED_PLATFORM_MDF_9_DEPTH)


with BuildPart() as body_4_1:
    # Body-Move/Copy1: moved
    add(body_4.part.moved(Location((283.308205777, 0, 0))))


with BuildPart() as body_3_1:
    # Body-Move/Copy1: moved
    add(body_3.part.moved(Location((283.308205777, 0, 0))))


with BuildPart() as body_2_1:
    # Body-Move/Copy2: moved
    add(body_2.part.moved(Location((0, 0, 46.115253355))))


with BuildPart() as body_4_2:
    # Body-Move/Copy2: moved
    add(body_4_1.part.moved(Location((0, 0, 46.115253355))))


with BuildPart() as body_4_3:
    # Body-Move/Copy3: moved
    add(body_4_2.part.moved(Location((13.847893126, 0, 0))))


with BuildPart() as body_2_2:
    # Body-Move/Copy4: moved
    add(body_2_1.part.moved(Location((-15.395150419, 0, 0))))


solid = Compound([part.part, body_3_1.part, body_4_3.part, body_2_2.part])
